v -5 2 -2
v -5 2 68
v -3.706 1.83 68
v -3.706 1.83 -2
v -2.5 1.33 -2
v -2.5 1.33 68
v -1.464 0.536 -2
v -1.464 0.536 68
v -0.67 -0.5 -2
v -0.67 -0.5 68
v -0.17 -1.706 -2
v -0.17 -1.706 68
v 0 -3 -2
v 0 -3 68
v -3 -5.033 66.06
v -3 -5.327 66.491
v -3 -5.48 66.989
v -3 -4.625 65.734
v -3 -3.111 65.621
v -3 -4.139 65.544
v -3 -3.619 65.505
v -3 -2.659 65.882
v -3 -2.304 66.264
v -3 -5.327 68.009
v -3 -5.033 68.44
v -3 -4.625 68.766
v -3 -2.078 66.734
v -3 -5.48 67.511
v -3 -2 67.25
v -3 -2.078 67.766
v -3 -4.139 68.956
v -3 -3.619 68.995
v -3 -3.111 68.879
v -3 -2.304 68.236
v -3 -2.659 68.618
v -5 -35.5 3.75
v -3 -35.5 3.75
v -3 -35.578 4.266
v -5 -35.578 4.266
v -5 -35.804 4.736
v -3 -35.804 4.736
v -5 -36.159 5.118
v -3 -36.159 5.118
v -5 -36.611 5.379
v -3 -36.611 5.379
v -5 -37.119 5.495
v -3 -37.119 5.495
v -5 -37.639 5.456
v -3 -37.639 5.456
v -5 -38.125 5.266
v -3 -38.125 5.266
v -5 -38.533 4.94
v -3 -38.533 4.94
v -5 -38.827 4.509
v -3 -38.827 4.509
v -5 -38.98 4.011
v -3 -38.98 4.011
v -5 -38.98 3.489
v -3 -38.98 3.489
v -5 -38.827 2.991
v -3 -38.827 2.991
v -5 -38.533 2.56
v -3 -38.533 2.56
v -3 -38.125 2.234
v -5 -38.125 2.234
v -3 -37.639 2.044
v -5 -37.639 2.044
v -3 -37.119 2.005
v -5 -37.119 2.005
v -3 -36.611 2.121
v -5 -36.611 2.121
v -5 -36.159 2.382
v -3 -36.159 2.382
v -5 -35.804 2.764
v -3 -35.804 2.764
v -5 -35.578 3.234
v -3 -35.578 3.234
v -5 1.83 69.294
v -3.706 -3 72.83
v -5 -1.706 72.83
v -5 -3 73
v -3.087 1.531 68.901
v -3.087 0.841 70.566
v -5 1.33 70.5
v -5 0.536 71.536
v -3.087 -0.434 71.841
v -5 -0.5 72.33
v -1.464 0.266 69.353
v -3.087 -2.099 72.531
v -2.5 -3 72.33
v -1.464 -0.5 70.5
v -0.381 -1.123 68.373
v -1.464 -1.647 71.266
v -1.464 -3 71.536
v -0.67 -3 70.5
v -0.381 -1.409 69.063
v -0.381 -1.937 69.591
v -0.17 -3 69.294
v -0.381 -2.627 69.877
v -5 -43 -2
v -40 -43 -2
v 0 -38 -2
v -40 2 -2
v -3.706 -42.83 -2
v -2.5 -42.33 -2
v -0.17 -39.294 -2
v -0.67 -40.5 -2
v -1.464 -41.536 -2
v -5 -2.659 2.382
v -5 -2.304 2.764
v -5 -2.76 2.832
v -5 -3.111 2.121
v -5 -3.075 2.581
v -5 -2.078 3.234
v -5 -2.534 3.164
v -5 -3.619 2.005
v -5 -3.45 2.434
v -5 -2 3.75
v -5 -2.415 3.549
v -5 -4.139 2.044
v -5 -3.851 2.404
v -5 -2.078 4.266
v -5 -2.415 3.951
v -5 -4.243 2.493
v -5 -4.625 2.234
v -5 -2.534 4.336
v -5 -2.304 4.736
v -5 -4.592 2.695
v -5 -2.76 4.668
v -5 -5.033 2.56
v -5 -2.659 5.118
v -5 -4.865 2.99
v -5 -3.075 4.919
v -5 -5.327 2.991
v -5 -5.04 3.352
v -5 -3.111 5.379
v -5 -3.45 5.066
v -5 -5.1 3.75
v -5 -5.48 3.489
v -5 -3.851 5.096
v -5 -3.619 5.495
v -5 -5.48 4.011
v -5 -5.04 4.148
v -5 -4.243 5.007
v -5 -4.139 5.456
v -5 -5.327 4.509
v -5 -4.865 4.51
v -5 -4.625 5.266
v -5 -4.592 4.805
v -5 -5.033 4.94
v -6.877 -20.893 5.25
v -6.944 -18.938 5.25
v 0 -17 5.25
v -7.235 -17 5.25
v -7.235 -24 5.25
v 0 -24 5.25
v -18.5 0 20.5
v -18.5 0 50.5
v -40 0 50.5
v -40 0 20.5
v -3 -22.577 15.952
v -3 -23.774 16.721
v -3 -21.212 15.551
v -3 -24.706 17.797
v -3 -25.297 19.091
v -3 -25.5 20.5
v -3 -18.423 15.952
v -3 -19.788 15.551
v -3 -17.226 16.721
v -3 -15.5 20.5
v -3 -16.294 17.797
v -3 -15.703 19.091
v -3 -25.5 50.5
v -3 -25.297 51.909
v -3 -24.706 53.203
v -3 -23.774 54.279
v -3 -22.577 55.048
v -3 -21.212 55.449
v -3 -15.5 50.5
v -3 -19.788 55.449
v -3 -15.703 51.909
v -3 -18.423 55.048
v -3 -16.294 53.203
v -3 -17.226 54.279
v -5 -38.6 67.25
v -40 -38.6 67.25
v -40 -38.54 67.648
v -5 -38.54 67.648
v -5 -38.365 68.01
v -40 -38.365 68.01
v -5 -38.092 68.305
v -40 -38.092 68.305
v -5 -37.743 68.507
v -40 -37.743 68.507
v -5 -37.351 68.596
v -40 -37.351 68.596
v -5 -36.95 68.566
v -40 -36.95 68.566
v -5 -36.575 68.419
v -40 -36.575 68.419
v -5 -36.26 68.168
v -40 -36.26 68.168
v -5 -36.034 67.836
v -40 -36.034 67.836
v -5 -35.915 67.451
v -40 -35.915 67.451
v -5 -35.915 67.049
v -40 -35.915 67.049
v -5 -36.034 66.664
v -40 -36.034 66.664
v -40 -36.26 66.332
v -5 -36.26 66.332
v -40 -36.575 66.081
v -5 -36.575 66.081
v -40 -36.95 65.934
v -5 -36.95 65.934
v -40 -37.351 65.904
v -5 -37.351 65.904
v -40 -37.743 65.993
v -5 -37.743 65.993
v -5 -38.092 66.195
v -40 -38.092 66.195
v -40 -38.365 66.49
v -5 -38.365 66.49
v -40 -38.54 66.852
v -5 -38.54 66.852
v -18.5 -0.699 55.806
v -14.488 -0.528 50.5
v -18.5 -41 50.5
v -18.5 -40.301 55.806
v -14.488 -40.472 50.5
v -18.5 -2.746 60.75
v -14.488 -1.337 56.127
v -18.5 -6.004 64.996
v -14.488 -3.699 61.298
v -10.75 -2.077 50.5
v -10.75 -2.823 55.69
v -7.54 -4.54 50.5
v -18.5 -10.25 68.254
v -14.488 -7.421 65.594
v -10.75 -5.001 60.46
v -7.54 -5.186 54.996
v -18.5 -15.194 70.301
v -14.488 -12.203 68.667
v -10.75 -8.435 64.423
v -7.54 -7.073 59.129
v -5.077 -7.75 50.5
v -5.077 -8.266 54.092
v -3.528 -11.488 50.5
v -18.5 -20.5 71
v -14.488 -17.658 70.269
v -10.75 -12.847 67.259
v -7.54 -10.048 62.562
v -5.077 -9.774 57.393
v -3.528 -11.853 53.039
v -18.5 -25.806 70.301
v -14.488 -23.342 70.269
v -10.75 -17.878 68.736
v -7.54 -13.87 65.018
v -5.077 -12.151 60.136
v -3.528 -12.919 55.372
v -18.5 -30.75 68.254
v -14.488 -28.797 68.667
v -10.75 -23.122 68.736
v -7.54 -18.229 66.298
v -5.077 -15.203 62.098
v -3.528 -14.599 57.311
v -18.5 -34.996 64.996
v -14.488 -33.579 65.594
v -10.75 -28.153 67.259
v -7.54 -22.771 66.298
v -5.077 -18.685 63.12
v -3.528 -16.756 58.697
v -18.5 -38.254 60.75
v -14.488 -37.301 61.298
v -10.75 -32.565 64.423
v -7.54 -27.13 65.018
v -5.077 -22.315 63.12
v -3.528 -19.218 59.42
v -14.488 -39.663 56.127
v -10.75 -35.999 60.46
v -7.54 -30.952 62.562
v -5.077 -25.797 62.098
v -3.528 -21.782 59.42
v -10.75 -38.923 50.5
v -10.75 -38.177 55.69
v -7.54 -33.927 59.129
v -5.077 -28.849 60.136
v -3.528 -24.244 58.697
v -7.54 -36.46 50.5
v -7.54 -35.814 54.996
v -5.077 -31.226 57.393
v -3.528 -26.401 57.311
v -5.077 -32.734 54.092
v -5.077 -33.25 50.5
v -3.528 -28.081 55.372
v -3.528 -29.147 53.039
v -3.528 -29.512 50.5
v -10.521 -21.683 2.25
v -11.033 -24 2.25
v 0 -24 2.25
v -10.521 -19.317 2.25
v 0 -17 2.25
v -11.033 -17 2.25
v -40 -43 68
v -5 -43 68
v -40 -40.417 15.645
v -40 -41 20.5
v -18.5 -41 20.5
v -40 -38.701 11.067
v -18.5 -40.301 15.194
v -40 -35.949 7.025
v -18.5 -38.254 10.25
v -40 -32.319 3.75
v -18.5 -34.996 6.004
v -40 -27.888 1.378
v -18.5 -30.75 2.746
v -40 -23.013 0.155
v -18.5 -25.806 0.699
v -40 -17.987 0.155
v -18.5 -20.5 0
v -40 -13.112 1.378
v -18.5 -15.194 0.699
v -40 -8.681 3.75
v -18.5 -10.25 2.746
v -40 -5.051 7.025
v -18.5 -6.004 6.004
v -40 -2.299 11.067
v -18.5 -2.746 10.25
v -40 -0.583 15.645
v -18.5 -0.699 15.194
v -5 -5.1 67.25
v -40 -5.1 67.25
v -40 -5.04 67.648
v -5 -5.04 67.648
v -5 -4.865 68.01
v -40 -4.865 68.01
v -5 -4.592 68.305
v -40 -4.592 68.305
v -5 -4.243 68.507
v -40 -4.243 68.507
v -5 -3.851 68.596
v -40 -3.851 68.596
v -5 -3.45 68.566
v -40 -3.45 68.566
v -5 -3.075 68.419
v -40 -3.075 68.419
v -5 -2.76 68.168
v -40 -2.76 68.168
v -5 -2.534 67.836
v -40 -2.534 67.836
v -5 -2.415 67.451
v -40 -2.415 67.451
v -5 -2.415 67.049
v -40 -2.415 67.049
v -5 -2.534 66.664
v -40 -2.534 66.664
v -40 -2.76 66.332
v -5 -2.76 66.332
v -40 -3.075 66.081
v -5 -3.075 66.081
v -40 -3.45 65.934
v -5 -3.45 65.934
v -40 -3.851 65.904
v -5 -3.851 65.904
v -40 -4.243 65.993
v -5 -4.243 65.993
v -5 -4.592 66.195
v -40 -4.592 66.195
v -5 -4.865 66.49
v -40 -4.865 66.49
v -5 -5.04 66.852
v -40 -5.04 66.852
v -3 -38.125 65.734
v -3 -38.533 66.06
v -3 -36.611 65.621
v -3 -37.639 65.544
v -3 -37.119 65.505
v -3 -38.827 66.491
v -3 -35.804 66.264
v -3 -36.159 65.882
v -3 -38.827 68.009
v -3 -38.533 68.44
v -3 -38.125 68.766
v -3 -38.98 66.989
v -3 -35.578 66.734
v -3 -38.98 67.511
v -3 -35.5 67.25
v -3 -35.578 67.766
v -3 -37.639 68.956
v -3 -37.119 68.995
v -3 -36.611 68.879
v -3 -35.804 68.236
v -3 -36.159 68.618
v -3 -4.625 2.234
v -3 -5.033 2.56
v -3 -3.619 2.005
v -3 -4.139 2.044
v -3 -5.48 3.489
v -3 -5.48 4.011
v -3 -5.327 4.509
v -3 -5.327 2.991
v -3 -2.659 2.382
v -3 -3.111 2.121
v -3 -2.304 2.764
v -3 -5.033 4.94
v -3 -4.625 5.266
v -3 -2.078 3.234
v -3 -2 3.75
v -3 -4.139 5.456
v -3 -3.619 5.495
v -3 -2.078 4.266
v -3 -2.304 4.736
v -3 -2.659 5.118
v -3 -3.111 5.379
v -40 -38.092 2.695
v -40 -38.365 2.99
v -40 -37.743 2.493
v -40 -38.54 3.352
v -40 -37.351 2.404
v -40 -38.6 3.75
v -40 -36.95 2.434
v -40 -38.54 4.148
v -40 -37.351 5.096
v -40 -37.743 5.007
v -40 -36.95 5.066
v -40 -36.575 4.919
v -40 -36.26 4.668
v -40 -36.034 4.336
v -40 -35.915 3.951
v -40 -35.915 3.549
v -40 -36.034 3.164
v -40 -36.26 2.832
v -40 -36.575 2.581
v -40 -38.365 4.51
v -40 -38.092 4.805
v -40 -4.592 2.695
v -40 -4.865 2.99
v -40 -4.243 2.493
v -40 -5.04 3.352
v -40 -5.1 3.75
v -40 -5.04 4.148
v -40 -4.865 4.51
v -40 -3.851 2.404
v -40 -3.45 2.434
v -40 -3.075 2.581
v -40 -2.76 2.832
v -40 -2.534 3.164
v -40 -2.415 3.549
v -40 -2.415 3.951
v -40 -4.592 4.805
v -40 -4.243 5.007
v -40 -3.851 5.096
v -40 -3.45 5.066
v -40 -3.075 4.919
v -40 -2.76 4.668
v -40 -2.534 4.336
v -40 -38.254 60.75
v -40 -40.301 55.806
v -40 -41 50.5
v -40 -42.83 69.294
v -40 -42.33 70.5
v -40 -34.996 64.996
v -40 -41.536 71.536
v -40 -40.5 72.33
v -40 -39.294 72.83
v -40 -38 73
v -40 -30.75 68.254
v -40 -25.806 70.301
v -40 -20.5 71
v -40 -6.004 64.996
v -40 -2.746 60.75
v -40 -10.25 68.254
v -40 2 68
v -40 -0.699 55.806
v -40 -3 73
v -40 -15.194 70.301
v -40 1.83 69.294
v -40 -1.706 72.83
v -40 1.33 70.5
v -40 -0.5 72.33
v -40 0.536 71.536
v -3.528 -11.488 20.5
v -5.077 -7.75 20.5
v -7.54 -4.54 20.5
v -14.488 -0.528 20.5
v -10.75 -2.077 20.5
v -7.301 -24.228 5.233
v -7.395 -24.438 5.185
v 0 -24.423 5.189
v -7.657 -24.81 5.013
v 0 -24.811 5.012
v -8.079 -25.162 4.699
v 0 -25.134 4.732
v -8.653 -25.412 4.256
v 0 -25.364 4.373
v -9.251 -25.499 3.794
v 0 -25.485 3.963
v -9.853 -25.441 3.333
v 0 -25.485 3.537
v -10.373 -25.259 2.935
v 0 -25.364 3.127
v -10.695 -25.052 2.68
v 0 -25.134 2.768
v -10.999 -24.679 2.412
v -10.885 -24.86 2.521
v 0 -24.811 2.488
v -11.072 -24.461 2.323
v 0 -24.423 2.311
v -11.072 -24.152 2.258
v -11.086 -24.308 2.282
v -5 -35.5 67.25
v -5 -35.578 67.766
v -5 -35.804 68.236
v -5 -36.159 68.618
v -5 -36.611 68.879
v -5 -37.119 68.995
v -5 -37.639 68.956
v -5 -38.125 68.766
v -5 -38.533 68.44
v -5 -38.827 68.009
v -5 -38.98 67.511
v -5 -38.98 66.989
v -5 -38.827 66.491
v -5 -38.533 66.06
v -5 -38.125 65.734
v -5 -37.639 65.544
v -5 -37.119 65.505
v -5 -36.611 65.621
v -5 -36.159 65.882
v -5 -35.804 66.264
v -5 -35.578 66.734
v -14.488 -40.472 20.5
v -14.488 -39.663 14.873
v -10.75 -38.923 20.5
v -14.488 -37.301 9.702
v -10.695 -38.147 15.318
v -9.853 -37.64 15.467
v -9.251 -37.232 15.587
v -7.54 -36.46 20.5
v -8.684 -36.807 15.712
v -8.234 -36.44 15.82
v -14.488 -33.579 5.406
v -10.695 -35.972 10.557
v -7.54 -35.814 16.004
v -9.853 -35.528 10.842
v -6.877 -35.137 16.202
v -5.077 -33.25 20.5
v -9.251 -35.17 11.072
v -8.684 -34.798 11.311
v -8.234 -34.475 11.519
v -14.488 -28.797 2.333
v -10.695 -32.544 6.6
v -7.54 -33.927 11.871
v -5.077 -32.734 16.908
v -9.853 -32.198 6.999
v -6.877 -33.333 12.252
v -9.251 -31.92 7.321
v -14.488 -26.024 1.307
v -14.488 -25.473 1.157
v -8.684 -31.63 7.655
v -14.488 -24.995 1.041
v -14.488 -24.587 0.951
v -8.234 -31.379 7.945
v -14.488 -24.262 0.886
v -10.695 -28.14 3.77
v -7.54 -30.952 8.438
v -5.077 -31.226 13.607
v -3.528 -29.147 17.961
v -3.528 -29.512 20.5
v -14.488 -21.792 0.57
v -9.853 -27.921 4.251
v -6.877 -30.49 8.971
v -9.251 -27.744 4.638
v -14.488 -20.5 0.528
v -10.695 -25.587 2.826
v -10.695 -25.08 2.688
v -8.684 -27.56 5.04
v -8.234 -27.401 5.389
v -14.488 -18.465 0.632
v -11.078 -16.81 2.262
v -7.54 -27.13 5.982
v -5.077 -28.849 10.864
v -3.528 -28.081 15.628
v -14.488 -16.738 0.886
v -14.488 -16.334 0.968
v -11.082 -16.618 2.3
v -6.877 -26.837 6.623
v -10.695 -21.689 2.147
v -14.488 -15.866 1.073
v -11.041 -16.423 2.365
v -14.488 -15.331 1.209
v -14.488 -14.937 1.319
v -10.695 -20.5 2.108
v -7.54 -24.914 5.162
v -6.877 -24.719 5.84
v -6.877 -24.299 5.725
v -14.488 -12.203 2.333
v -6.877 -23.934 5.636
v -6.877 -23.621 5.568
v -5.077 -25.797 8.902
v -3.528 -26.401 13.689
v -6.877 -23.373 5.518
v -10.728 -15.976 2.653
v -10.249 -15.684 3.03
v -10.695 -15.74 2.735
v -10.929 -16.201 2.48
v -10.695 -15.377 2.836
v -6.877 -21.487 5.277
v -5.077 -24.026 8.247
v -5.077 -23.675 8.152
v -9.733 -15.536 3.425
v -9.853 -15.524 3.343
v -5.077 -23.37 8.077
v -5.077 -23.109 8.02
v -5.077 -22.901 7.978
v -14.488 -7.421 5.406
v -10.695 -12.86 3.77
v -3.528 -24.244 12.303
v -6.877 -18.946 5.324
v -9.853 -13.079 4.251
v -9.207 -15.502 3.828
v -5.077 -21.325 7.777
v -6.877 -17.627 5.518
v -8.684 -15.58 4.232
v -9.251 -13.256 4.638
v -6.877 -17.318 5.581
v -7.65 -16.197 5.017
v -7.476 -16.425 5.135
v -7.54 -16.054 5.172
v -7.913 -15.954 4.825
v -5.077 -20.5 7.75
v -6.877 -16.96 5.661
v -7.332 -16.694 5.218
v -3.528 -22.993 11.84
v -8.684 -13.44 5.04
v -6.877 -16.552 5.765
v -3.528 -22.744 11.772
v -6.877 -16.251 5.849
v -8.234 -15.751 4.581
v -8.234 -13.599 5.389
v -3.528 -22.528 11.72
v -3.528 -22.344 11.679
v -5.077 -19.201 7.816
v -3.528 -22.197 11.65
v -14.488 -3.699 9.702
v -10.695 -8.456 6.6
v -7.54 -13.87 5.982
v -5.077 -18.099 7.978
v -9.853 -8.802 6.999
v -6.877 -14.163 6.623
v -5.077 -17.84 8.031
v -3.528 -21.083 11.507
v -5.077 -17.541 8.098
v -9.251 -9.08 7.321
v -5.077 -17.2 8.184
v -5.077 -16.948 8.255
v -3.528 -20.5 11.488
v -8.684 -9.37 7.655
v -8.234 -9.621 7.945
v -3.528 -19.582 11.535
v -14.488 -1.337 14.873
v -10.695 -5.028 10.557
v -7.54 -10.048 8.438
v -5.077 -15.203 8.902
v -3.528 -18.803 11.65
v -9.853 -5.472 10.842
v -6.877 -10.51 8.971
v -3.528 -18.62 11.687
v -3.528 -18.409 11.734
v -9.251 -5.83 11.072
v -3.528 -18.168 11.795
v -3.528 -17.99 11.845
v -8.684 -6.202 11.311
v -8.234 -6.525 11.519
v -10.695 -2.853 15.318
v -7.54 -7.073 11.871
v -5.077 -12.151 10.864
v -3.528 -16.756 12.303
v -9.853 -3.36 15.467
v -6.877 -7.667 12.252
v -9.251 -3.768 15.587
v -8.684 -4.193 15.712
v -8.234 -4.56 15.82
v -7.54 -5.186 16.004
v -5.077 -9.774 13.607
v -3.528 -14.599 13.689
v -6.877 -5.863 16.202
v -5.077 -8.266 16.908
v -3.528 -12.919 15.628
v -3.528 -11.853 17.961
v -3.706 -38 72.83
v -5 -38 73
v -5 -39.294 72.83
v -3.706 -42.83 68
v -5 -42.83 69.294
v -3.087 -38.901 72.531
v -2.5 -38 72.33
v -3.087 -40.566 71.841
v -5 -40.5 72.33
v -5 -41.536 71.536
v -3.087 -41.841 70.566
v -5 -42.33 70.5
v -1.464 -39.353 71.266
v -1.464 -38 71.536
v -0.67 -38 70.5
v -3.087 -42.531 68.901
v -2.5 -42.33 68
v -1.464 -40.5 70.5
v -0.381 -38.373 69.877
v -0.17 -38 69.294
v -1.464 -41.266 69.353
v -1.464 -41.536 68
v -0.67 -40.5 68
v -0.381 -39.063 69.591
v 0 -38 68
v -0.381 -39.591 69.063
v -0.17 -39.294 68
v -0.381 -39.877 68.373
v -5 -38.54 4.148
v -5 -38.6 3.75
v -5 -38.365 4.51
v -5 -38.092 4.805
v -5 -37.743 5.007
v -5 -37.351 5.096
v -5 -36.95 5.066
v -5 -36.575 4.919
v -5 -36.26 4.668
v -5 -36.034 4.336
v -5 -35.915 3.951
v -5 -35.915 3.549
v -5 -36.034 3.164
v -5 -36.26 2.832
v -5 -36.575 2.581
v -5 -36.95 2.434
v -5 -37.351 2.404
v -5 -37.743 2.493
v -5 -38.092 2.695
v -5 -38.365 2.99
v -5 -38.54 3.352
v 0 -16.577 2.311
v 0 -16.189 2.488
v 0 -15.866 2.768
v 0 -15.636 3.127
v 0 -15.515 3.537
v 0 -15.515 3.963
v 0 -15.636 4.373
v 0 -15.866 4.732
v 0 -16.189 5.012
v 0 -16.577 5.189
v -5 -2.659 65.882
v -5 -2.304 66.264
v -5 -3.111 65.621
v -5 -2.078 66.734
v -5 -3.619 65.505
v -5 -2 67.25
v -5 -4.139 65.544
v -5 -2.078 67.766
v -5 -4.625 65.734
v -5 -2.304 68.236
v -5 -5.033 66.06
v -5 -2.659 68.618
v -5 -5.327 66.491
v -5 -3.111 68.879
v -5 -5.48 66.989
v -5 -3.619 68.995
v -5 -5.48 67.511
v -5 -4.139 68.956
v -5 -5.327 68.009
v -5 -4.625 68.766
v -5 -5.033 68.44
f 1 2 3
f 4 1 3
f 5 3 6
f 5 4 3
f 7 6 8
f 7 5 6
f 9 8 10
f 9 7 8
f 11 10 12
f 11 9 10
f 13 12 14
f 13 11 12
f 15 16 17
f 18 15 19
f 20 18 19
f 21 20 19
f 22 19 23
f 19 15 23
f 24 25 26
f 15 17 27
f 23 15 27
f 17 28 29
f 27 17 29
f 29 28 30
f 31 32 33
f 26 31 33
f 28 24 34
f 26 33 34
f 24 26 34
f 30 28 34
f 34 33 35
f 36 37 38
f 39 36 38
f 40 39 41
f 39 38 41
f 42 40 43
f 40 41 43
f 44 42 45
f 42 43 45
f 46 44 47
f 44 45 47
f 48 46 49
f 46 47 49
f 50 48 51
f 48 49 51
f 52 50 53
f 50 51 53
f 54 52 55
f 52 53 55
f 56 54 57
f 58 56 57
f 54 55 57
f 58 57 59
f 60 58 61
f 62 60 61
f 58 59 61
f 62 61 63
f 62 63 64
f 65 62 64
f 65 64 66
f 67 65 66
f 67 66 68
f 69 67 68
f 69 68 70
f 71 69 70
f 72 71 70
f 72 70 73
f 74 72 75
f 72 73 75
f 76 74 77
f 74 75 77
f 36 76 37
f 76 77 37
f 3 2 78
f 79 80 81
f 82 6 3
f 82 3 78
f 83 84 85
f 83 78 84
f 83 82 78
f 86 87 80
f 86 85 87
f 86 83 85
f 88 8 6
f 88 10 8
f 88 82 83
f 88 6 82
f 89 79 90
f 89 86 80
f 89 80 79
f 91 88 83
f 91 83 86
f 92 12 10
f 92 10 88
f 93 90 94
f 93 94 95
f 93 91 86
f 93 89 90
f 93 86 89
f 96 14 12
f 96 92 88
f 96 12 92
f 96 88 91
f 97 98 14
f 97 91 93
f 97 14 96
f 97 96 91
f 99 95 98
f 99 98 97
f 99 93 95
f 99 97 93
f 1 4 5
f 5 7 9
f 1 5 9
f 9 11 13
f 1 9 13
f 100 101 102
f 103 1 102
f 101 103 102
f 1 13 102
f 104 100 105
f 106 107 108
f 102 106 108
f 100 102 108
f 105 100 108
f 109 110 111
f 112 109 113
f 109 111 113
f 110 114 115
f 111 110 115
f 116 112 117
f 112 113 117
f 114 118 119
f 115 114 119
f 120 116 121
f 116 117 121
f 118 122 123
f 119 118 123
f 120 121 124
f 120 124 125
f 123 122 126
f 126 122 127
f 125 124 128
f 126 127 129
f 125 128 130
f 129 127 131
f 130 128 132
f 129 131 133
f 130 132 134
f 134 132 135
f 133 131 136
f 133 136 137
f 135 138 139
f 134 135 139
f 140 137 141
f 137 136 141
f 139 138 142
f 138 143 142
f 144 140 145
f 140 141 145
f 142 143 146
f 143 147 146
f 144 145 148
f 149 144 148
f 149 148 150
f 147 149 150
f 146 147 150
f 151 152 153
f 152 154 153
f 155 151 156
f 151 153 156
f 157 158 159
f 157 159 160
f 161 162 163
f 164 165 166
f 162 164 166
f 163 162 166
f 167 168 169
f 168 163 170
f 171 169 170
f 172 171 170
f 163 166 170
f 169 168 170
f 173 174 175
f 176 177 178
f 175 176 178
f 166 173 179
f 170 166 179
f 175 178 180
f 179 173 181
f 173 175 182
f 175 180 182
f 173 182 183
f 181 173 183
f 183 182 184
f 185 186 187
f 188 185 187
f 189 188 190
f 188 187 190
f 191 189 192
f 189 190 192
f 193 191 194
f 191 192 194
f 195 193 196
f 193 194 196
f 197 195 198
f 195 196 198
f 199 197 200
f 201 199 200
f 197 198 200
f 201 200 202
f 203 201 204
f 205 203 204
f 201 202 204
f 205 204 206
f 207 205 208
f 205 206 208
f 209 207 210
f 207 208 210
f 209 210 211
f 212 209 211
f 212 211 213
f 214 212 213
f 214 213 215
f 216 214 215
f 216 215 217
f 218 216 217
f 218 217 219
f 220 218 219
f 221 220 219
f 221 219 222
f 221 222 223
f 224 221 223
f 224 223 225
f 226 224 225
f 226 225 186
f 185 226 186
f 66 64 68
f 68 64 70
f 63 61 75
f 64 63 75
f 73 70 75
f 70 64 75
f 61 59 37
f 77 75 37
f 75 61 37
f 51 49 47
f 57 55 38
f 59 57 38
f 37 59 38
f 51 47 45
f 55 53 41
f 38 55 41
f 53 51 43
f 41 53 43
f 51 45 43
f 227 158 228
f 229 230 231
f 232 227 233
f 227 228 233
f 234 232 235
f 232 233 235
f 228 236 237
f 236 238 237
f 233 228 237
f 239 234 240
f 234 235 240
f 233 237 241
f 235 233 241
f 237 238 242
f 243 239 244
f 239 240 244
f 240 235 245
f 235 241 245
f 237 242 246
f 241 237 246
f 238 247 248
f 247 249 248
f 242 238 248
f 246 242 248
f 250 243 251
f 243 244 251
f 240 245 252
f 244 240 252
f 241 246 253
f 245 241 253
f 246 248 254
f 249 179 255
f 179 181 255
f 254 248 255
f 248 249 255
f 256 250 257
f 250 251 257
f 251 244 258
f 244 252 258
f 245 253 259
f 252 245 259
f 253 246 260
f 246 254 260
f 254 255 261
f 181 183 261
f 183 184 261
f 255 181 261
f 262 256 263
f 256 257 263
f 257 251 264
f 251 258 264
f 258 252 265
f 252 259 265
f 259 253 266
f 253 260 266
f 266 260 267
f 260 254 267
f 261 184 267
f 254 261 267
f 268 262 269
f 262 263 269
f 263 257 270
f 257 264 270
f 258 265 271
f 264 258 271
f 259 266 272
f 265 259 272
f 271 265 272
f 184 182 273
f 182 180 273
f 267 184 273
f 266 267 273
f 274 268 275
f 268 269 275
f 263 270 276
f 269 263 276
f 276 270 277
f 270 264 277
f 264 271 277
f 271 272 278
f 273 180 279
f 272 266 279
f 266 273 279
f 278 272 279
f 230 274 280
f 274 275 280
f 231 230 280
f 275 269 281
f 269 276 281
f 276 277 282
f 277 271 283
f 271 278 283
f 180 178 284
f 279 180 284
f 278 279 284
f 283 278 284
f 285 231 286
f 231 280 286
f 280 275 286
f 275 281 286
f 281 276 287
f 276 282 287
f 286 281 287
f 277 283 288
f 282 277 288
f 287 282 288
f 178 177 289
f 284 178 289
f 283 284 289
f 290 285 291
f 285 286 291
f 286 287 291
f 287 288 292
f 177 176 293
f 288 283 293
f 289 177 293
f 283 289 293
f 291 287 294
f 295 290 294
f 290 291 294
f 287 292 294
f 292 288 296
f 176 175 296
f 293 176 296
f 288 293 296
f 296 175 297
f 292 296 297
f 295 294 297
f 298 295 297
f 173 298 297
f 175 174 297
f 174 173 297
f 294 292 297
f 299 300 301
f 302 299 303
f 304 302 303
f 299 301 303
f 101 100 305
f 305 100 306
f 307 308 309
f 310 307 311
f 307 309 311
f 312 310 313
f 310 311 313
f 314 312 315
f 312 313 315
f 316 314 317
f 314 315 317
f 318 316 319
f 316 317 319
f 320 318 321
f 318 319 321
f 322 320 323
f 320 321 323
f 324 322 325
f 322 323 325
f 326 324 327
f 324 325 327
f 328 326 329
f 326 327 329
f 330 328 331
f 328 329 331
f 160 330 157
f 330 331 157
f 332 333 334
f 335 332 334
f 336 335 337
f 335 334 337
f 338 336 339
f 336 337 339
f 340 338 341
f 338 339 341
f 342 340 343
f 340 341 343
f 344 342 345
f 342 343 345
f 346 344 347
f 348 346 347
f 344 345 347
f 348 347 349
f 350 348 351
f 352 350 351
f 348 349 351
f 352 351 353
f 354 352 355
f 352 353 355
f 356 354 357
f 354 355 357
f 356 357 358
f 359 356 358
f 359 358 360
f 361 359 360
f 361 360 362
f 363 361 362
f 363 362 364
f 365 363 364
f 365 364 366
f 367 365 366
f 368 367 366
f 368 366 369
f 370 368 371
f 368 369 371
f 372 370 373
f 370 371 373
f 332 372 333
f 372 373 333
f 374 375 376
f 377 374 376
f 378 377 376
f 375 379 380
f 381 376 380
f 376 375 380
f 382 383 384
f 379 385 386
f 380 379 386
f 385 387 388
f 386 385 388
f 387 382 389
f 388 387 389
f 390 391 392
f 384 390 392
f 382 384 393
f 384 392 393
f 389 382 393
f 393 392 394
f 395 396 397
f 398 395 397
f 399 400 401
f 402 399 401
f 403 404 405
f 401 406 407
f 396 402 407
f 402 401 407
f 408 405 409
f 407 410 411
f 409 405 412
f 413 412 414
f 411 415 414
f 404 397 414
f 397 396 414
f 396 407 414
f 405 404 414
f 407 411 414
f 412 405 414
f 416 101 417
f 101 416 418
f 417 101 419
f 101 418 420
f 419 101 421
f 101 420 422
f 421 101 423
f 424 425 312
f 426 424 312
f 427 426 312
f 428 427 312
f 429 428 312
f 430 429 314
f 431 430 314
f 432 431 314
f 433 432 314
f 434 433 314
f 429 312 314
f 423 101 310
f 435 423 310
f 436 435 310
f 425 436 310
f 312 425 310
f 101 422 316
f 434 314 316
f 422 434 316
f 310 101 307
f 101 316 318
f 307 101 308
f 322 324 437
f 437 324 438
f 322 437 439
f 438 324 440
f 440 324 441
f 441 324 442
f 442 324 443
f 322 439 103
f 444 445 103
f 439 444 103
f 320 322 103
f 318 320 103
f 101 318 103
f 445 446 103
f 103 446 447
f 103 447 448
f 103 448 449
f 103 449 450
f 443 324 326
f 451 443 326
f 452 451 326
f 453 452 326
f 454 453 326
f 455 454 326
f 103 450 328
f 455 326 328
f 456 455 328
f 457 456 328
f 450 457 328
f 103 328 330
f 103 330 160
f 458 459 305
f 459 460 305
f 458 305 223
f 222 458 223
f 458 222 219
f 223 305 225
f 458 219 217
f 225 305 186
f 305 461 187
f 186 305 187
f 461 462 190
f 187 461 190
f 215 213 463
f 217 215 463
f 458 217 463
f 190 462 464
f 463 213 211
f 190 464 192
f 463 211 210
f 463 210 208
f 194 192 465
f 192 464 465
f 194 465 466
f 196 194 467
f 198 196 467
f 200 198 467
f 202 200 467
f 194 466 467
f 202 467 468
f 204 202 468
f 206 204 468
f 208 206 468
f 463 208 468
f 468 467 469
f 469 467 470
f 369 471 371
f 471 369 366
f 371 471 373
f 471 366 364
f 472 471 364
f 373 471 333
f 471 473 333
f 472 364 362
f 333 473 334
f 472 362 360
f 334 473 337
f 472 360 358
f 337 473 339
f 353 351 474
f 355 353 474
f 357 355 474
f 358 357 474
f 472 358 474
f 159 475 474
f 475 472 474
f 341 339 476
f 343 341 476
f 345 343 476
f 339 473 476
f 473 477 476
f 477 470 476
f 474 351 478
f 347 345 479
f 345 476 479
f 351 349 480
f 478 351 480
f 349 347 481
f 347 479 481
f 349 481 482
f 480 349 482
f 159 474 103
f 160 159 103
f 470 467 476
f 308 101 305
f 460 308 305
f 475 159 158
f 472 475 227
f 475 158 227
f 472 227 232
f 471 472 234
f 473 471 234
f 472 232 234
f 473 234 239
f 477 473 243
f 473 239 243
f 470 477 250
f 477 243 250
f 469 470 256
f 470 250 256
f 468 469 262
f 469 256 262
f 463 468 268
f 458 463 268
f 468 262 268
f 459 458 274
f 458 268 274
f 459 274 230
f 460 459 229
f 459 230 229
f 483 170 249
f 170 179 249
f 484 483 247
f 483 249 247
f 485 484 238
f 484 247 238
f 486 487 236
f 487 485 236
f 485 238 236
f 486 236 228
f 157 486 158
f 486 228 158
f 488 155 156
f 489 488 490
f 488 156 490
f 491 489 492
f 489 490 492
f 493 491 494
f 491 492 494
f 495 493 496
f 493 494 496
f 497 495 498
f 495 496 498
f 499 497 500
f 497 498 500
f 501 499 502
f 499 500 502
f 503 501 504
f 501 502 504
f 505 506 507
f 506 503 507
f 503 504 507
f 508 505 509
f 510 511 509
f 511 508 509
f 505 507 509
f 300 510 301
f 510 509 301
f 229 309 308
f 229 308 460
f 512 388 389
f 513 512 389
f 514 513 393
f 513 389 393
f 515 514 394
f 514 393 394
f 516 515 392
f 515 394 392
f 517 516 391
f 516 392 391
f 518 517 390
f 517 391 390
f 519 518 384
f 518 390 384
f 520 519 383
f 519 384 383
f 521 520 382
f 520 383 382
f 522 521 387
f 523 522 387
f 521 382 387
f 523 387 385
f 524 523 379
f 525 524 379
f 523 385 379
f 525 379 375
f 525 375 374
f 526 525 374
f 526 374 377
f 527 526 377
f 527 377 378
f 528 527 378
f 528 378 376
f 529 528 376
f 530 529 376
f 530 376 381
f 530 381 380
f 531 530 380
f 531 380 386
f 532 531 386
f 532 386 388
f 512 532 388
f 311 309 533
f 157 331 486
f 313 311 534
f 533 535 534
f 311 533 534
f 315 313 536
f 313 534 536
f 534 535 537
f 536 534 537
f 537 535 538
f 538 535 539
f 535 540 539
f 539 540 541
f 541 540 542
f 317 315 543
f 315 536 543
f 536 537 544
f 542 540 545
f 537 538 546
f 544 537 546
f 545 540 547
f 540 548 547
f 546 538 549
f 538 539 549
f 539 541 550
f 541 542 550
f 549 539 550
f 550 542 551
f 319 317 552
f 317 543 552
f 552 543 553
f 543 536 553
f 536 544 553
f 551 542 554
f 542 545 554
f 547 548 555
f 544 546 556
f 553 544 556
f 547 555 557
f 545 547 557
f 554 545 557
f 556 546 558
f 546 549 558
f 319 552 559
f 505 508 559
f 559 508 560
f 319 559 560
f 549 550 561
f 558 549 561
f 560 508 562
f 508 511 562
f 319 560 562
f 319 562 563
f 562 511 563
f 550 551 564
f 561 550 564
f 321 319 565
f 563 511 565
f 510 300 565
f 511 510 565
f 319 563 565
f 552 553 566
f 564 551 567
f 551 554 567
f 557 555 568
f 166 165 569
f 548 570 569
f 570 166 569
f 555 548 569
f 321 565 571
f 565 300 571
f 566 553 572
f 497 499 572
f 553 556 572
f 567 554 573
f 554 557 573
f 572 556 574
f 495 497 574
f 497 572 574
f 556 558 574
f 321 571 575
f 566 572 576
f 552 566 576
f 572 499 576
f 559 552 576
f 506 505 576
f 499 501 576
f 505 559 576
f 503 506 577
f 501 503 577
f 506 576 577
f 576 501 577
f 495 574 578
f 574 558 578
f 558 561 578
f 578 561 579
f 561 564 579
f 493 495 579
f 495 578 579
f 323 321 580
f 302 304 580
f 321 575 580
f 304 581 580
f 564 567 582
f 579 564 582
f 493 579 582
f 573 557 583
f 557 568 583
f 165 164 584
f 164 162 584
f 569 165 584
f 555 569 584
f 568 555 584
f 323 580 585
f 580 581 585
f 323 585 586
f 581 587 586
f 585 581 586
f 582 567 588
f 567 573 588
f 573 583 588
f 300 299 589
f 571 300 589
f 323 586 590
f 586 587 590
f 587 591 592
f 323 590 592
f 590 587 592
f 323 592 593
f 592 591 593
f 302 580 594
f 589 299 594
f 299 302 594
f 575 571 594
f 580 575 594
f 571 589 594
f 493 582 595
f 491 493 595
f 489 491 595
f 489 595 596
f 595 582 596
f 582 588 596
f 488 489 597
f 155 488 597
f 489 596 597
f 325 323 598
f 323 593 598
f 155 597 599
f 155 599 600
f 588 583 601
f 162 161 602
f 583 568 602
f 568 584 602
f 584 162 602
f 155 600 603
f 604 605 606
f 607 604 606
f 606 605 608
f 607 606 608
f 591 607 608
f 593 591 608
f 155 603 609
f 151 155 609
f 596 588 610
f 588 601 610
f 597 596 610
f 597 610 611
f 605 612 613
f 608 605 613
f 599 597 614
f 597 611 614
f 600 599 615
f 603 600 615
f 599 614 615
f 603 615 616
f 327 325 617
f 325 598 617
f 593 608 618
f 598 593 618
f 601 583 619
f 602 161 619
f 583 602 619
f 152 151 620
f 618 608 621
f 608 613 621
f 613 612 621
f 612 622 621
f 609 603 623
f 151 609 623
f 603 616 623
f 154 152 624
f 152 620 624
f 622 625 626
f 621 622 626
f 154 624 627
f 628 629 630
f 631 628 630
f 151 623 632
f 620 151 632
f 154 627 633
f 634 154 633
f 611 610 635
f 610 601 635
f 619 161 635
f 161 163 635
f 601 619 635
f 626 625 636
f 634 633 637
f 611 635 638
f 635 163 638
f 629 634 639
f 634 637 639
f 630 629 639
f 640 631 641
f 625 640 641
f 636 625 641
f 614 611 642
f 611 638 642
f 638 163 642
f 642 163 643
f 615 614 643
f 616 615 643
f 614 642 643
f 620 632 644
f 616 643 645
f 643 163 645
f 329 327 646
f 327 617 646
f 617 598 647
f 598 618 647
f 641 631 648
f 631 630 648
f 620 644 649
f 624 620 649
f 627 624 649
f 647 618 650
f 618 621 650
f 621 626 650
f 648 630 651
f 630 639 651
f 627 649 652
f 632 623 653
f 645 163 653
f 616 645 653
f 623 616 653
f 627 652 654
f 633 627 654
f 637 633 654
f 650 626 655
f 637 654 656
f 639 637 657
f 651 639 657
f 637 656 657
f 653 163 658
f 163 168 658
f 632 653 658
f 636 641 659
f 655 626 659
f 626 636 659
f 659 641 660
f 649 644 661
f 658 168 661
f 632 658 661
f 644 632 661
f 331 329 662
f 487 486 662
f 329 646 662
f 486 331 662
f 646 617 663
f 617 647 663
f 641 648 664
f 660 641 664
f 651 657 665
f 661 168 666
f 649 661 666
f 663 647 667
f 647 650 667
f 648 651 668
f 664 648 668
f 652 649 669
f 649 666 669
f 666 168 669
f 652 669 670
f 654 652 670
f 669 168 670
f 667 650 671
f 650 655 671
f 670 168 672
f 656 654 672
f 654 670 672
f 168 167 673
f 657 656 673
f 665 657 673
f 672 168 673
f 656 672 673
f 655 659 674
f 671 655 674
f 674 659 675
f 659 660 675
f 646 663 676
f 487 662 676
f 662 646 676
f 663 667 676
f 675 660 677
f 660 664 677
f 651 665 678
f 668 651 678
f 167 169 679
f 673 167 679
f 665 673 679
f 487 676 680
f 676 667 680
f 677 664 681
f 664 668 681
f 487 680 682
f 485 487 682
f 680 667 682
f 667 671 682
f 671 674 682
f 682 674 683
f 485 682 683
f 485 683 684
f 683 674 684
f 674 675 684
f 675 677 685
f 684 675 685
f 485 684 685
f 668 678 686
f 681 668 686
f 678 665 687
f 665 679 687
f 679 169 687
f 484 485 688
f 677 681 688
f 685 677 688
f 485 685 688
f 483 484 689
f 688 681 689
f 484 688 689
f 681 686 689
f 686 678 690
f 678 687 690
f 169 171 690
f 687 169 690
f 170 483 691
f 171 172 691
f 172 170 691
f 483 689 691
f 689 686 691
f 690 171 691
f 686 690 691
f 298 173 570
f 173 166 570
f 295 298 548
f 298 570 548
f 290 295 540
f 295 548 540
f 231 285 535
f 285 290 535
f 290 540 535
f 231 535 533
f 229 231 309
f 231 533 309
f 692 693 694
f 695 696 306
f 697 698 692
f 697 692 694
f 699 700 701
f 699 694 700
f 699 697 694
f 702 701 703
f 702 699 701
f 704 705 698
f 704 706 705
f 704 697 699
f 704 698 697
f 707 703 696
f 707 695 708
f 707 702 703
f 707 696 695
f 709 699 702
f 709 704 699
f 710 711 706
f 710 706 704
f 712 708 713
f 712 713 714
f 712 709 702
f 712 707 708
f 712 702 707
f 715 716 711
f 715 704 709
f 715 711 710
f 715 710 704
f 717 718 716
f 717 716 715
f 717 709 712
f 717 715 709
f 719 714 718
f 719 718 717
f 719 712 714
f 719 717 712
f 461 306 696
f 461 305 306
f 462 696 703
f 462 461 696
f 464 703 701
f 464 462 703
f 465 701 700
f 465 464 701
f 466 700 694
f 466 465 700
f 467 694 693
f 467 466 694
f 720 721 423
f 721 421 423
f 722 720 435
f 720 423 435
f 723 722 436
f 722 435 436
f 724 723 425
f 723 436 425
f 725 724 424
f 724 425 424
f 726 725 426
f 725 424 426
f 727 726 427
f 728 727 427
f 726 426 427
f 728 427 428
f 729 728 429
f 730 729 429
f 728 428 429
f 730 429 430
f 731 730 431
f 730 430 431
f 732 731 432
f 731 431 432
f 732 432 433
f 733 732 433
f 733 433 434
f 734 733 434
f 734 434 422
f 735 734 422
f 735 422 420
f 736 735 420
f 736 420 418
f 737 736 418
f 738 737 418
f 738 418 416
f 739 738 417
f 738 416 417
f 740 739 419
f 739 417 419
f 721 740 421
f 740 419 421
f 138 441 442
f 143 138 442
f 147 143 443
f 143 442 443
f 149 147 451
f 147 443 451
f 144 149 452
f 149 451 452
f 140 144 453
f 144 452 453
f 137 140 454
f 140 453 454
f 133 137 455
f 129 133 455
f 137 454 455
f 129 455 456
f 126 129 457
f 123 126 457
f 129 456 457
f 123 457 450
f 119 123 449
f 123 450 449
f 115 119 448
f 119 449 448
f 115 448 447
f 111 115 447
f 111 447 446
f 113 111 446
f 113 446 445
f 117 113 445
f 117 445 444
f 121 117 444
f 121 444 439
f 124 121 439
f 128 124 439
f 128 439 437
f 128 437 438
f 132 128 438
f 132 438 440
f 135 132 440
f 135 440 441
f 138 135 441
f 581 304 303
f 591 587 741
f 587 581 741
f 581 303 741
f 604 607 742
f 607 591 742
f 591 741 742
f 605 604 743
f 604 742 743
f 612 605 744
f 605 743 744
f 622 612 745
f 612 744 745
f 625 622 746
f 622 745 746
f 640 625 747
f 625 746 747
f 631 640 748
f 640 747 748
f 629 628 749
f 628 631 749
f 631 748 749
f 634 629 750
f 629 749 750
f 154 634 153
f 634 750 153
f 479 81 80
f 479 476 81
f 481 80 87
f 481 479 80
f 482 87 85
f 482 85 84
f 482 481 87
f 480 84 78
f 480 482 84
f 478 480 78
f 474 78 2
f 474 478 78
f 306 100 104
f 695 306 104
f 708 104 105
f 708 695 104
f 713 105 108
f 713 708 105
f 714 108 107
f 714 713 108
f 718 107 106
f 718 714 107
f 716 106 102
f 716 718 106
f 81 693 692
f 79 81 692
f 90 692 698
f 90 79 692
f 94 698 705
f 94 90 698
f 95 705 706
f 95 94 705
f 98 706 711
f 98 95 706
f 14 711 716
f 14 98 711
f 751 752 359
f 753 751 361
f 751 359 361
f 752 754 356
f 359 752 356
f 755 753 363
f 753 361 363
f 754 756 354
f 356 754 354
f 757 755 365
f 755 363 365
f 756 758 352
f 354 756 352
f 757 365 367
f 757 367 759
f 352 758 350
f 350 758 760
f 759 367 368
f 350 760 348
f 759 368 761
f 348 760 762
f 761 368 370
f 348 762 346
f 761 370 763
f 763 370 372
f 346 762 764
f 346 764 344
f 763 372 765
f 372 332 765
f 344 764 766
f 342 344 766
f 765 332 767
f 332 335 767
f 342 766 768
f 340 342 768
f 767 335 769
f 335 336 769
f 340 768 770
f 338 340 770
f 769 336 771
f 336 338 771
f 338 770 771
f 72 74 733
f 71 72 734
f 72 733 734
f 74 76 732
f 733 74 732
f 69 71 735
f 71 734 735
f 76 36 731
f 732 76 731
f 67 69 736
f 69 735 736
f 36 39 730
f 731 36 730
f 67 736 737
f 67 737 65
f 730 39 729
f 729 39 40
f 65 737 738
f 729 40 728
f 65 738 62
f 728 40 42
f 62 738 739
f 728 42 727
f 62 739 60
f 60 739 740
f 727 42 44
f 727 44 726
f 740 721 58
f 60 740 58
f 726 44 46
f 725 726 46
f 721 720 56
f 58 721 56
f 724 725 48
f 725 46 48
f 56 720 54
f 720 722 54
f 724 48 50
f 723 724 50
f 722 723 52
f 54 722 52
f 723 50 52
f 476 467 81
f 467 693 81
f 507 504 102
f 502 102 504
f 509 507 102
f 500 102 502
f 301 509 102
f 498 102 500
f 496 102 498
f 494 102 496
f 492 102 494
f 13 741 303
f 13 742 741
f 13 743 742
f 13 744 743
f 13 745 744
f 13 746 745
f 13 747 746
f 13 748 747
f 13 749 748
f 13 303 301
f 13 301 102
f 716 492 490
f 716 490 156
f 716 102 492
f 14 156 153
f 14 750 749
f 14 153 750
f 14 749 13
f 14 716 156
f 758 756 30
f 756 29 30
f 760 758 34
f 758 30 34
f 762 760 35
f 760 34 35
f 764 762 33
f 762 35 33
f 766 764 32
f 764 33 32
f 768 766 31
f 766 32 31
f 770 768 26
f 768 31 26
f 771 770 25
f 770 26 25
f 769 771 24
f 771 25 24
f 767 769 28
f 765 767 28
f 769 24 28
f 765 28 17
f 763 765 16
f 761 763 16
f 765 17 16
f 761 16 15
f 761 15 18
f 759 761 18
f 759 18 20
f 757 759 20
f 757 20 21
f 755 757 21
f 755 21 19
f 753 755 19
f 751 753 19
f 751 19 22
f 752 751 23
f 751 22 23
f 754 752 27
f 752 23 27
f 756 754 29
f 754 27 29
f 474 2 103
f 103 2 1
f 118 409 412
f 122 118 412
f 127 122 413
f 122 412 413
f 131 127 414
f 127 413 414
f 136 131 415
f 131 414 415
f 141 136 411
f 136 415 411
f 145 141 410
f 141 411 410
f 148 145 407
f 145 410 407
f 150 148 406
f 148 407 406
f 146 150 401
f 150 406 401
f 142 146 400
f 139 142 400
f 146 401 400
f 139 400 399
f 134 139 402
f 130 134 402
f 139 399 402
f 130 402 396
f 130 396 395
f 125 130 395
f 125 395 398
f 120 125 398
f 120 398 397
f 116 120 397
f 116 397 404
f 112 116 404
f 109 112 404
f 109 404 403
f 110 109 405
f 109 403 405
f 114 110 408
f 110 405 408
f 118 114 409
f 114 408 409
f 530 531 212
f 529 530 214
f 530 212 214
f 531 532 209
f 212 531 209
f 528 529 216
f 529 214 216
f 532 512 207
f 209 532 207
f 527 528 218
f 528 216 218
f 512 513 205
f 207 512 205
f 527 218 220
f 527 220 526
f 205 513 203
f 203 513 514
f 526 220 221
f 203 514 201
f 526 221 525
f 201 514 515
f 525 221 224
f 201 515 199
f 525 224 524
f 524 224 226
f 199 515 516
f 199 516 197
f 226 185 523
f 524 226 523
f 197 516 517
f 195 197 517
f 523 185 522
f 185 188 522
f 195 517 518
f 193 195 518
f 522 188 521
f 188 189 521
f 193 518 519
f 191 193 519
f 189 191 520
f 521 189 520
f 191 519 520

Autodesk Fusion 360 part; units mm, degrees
sketch "Sketch1" plane through (0, 0, 0) normal (1, 0, 0) x (0, 1, 0)
  line L0 (0, 0) -> (-41, 0)
  line L1 (-41, 0) -> (-41, 71)
  line L2 (-41, 71) -> (0, 71)
  line L3 (0, 71) -> (0, 0)
  line L4 (-20.5, 71) -> (-20.5, 50.5)
  line L5 (-41, 35.5) -> (0, 35.5)
  line L6 (-38, 50.5) -> (-38, 20.5)
  arc A0 (-38, 20.5) -> (-3, 20.5) centre (-20.5, 20.5) ccw
  line L7 (-3, 20.5) -> (-3, 50.5)
  arc A1 (-3, 50.5) -> (-38, 50.5) centre (-20.5, 50.5) ccw
  line L8 (-20.5, 50.5) -> (-20.5, 20.5) construction
  line L9 (-39.7873, 50.5) -> (-39.7873, 20.5)
  arc A2 (-39.7873, 20.5) -> (-1.2127, 20.5) centre (-20.5, 20.5) ccw
  line L10 (-1.2127, 20.5) -> (-1.2127, 50.5)
  arc A3 (-1.2127, 50.5) -> (-39.7873, 50.5) centre (-20.5, 50.5) ccw
  line L11 (-20.5, 50.5) -> (-20.5, 20.5) construction
  line L12 (-3.75, 71) -> (-3.75, 67.25)
  line L13 (0, 67.25) -> (-3.75, 67.25)
  circle A4 centre (-3.75, 67.25) radius 1.75
  circle A5 centre (-37.25, 67.25) radius 1.75
  circle A6 centre (-37.25, 3.75) radius 1.75
  circle A7 centre (-3.75, 3.75) radius 1.75
  line L14 (-20.5, 71) -> (-20.5, 0) construction
  line L15 (2, -2) -> (-43, -2)
  line L16 (-43, -2) -> (-43, 73)
  line L17 (-43, 73) -> (2, 73)
  line L18 (2, 73) -> (2, -2)
  line L19 (-41, 50.5) -> (-41, 20.5)
  arc A8 (-41, 20.5) -> (0, 20.5) centre (-20.5, 20.5) ccw
  line L20 (0, 20.5) -> (0, 50.5)
  arc A9 (0, 50.5) -> (-41, 50.5) centre (-20.5, 50.5) ccw
  line L21 (-20.5, 50.5) -> (-20.5, 20.5) construction
  line L22 (-37.25, 3.75) -> (-3.75, 3.75)
  line L23 (-24, 2.25) -> (-17, 2.25)
  arc A10 (-17, 2.25) -> (-17, 5.25) centre (-17, 3.75) ccw
  line L24 (-17, 5.25) -> (-24, 5.25)
  arc A11 (-24, 5.25) -> (-24, 2.25) centre (-24, 3.75) ccw
  line L25 (-24, 3.75) -> (-17, 3.75) construction
  point P0 (-20.5, 3.75)
  dimension "d1" = 41
  dimension "d2" = 71
  dimension "d3" = 20.5
  dimension "d4" = 35
  dimension "d5" = 3.75
  dimension "d6" = 3.75
  dimension "d7" = 3.5
  dimension "d8" = 1.7873
  dimension "d9" = 30
  dimension "d10" = -2
  dimension "d27" = 3
extrude "Extrude1" add sketch "Sketch1" against normal blind 40 contours L0 L3 A8 | L0 L1 A8 | L2 L3 L12 L13 A4 A9 | L2 L3 L12 L13 A4 | L1 L2 A9 | L15 L16 L17 L18
extrude "Extrude2" add sketch "Sketch1" against normal blind 3 contours A7 | A6 | A2 A8 L22 | L3 L5 A2 L10 A8 L20 L22 | L1 L5 L9 A2 L19 A8 L22 | L3 L4 L5 L10 A3 L20 A9 | A0 A2 L22 L23 A10 A11 | L5 L6 A0 L9 A2 L22 | L5 A0 L7 A2 L10 L22 | L4 L5 L7 A1 L10 A3 | L1 L4 L5 L9 A3 L19 A9 | A0 L22 A11 | L5 L6 A0 L7 L22 A10 L24 A11 | A0 L22 A10 | L5 L6 L7 A1 | L4 L5 L6 A1 L9 A3 | A0 L22 A10 A11 | A0 L23 A10 A11 | L22 A10 L24 A11 | L12 L13 A4 | L12 L13 A4 | A5
fillet "Fillet2" radius 15.5 4 edges at (-3, -20.5, 0) (-3, 0, 35.5) (-3, -20.5, 71) (-3, -41, 35.5)
fillet "Fillet1" radius 5 2 edges at (-20, 2, 73) (-20, -43, 73)
fillet "Fillet3" radius 5 5 edges at (0, -43, 33) (0, -41.5355, 71.5355) (0, -20.5, 73) (0, 0.5355, 71.5355) (0, 2, 33)
sketch "Sketch2" plane through (-40, 0, 0) normal (-1, 0, 0) x (0, -1, 0)
  arc A0 (43, 68) -> (38, 73) centre (38, 68) ccw
  line L0 (38, 73) -> (3, 73)
  arc A1 (3, 73) -> (-2, 68) centre (3, 68) ccw
  line L1 (-2, 68) -> (-2, -2)
  line L2 (-2, -2) -> (43, -2)
  line L3 (43, -2) -> (43, 68)
  arc A2 (41, 50.5) -> (0, 50.5) centre (20.5, 50.5) ccw
  line L4 (41, 50.5) -> (41, 20.5)
  arc A3 (0, 20.5) -> (41, 20.5) centre (20.5, 20.5) ccw
  line L5 (0, 20.5) -> (0, 50.5)
  circle A4 centre (3.75, 3.75) radius 1.75
  circle A5 centre (37.25, 3.75) radius 1.75
  circle A6 centre (37.25, 67.25) radius 1.75
  circle A7 centre (3.75, 67.25) radius 1.75
  circle A8 centre (3.75, 67.25) radius 1.35
  circle A9 centre (3.75, 3.75) radius 1.35
  circle A10 centre (37.25, 3.75) radius 1.35 construction
  circle A11 centre (37.25, 67.25) radius 1.35 construction
  circle A12 centre (37.25, 67.25) radius 1.75
  circle A13 centre (37.25, 3.75) radius 1.75
  circle A14 centre (3.75, 3.75) radius 1.75
  circle A15 centre (3.75, 67.25) radius 1.75
  circle A16 centre (37.25, 3.75) radius 1.35
  circle A17 centre (37.25, 67.25) radius 1.35
  dimension "d21" = 2.7
  dimension "d22" = 2.7
  dimension "d23" = 2.7
  dimension "d24" = 2.7
extrude "Extrude3" add sketch "Sketch2" against normal blind 35 contours A4 A14 | A5 A13 | A6 A12 | A7 A15
extrude "Extrude4" cut sketch "Sketch1" against normal blind 39 contours A0 L22 A10 A11 | A0 L23 A10 A11 | L22 A10 L24 A11
equation "d3 = ( 41 / 2 ) * 1 mm"
equation "d5 = 2 mm + ( 3.5 / 2 ) * 1 mm"
equation "d6 = 2 mm + ( ( 3.5 / 2 ) * 1 mm )"
